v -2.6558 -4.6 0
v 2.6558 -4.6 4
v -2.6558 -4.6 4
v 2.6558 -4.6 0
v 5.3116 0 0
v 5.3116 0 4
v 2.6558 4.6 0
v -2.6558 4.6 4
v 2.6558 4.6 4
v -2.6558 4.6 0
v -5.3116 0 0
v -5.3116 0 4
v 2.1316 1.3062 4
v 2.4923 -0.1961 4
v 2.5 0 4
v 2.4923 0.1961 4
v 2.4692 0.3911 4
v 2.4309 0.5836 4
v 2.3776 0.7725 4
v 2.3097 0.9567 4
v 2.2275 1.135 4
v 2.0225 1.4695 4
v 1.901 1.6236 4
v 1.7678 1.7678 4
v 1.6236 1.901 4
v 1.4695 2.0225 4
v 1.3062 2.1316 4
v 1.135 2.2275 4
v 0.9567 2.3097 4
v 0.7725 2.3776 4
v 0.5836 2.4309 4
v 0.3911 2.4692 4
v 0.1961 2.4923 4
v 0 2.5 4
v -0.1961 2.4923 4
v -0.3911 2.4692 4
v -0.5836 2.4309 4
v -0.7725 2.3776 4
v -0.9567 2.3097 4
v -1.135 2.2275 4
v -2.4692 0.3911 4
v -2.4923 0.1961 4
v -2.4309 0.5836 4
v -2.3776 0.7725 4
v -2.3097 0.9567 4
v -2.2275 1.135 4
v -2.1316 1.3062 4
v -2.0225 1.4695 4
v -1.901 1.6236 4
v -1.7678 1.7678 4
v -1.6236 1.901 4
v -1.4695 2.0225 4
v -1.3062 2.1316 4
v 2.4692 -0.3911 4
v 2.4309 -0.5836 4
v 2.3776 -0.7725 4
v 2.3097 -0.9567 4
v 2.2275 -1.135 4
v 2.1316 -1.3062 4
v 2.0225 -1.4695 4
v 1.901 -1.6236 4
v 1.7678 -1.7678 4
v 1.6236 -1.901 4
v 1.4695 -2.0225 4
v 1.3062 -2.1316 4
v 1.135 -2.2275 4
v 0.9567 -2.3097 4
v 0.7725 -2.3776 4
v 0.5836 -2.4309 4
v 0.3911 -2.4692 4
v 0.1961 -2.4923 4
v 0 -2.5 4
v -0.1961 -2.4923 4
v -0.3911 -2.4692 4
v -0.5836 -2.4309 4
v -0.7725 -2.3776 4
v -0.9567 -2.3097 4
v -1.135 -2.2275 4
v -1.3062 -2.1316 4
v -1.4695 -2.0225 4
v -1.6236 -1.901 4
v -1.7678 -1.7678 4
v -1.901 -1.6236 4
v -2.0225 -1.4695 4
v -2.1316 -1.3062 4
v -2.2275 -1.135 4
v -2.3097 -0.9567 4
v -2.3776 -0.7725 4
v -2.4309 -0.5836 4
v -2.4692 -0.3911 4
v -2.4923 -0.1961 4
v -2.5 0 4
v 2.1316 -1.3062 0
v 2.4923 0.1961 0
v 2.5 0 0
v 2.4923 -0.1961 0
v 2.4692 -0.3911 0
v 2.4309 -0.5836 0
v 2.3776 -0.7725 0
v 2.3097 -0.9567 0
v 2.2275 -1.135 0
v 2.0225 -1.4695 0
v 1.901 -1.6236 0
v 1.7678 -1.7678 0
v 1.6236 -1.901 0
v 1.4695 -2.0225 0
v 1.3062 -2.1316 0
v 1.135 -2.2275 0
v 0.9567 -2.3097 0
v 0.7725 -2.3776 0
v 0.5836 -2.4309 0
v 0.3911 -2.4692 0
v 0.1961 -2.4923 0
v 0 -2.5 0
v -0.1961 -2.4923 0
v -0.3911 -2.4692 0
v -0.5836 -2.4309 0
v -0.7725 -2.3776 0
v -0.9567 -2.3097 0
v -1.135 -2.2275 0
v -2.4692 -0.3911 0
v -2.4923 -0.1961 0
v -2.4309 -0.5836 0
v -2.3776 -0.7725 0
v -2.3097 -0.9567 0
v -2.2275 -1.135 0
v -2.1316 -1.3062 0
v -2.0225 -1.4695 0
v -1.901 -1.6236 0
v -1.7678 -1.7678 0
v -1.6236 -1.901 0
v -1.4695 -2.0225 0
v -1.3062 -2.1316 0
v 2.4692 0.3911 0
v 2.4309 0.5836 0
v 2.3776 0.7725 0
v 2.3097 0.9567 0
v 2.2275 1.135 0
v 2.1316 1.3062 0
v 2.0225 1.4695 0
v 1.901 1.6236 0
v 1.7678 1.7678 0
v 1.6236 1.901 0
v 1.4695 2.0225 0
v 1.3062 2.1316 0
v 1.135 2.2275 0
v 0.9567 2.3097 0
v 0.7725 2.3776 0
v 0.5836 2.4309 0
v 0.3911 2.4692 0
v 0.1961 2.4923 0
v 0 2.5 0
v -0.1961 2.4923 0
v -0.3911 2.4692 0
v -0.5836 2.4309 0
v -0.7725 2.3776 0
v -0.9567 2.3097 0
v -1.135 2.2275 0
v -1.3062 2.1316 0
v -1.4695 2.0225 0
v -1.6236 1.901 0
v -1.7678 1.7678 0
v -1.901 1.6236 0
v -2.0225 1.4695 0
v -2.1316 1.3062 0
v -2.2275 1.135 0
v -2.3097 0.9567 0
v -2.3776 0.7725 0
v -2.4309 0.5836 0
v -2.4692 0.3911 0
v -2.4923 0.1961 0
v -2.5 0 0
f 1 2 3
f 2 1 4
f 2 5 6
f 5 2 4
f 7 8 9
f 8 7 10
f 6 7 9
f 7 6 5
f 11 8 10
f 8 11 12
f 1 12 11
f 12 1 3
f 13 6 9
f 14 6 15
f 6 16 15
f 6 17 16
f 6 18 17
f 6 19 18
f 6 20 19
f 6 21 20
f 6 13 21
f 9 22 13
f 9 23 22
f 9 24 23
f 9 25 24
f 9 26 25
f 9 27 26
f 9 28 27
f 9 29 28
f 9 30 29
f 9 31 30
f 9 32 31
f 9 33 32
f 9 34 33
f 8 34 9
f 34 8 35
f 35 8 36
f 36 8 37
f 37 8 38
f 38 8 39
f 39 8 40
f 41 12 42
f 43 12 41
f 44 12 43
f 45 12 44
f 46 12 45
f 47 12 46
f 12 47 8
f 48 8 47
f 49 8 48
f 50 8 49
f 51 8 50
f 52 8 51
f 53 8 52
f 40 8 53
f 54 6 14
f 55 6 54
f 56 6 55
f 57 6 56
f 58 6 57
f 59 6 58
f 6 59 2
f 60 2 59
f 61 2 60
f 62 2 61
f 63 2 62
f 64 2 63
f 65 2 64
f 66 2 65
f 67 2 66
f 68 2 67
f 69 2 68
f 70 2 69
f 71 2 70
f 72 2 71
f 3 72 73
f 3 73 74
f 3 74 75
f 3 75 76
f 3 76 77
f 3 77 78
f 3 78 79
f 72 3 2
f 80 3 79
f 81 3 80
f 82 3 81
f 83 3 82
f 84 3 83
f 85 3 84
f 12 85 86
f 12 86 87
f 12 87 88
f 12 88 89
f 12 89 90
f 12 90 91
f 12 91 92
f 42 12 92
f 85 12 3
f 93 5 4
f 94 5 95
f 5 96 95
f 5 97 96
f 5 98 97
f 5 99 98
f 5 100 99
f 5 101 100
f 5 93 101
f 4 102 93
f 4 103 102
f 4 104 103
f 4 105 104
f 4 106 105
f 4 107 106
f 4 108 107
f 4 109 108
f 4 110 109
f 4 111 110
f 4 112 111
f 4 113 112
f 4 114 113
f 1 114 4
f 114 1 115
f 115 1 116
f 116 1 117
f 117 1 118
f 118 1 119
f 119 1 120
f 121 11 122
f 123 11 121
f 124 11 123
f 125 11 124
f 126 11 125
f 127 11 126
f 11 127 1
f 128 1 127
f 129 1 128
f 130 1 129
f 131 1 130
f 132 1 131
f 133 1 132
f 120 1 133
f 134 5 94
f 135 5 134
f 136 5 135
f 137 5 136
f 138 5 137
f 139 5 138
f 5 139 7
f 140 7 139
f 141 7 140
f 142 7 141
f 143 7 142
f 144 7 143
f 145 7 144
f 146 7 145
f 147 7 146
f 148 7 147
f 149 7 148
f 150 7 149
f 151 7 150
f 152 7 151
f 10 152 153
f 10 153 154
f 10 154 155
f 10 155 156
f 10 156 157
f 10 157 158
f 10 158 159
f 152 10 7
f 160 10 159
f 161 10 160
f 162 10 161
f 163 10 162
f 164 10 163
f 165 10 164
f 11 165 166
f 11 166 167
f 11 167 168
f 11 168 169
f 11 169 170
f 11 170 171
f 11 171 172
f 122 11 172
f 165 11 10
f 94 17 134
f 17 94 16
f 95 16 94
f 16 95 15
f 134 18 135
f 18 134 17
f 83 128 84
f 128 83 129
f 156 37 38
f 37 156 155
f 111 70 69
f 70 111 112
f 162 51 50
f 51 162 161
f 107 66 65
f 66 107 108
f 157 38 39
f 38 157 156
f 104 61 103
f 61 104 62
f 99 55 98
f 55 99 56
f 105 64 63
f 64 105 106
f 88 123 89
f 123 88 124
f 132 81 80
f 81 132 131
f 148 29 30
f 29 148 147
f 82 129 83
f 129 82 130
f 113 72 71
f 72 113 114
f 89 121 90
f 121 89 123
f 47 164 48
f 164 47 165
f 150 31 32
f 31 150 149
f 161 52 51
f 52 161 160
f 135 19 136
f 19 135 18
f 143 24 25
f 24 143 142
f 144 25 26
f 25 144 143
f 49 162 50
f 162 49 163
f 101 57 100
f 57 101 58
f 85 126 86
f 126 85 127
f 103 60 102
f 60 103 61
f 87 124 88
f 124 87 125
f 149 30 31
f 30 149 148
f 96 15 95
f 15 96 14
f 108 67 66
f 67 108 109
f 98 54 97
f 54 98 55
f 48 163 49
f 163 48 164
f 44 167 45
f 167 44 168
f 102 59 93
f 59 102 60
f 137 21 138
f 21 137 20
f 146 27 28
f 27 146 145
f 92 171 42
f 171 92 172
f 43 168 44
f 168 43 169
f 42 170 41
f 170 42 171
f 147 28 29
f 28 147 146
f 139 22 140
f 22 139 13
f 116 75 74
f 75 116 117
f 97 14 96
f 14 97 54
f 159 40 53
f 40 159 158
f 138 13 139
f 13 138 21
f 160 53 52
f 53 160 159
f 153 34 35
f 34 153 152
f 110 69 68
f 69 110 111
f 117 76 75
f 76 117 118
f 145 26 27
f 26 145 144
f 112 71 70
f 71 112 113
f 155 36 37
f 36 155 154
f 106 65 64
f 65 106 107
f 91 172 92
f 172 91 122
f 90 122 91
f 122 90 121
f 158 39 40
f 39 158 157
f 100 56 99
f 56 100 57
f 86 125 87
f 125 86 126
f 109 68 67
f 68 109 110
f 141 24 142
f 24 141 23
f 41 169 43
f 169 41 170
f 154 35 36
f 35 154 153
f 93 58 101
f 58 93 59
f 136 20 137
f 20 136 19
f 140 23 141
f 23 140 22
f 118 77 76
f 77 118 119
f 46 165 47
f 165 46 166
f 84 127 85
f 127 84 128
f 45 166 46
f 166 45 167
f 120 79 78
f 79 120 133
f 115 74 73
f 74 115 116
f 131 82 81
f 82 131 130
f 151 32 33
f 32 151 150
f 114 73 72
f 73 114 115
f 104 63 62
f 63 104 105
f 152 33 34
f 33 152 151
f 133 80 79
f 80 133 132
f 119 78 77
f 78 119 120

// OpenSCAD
$fn = 120;

screw_d = 5.0;          // mm (clearance hole)
across_flats = 9.2;     // mm
thickness = 4.0;        // mm

// Convert across-flats to circumradius for a regular hexagon
hex_R = across_flats / sqrt(3);

difference() {
    // Hex body
    cylinder(h = thickness, r = hex_R, $fn = 6);

    // Through hole
    translate([0, 0, -0.2])
        cylinder(h = thickness + 0.4, d = screw_d, $fn = 80);
}
